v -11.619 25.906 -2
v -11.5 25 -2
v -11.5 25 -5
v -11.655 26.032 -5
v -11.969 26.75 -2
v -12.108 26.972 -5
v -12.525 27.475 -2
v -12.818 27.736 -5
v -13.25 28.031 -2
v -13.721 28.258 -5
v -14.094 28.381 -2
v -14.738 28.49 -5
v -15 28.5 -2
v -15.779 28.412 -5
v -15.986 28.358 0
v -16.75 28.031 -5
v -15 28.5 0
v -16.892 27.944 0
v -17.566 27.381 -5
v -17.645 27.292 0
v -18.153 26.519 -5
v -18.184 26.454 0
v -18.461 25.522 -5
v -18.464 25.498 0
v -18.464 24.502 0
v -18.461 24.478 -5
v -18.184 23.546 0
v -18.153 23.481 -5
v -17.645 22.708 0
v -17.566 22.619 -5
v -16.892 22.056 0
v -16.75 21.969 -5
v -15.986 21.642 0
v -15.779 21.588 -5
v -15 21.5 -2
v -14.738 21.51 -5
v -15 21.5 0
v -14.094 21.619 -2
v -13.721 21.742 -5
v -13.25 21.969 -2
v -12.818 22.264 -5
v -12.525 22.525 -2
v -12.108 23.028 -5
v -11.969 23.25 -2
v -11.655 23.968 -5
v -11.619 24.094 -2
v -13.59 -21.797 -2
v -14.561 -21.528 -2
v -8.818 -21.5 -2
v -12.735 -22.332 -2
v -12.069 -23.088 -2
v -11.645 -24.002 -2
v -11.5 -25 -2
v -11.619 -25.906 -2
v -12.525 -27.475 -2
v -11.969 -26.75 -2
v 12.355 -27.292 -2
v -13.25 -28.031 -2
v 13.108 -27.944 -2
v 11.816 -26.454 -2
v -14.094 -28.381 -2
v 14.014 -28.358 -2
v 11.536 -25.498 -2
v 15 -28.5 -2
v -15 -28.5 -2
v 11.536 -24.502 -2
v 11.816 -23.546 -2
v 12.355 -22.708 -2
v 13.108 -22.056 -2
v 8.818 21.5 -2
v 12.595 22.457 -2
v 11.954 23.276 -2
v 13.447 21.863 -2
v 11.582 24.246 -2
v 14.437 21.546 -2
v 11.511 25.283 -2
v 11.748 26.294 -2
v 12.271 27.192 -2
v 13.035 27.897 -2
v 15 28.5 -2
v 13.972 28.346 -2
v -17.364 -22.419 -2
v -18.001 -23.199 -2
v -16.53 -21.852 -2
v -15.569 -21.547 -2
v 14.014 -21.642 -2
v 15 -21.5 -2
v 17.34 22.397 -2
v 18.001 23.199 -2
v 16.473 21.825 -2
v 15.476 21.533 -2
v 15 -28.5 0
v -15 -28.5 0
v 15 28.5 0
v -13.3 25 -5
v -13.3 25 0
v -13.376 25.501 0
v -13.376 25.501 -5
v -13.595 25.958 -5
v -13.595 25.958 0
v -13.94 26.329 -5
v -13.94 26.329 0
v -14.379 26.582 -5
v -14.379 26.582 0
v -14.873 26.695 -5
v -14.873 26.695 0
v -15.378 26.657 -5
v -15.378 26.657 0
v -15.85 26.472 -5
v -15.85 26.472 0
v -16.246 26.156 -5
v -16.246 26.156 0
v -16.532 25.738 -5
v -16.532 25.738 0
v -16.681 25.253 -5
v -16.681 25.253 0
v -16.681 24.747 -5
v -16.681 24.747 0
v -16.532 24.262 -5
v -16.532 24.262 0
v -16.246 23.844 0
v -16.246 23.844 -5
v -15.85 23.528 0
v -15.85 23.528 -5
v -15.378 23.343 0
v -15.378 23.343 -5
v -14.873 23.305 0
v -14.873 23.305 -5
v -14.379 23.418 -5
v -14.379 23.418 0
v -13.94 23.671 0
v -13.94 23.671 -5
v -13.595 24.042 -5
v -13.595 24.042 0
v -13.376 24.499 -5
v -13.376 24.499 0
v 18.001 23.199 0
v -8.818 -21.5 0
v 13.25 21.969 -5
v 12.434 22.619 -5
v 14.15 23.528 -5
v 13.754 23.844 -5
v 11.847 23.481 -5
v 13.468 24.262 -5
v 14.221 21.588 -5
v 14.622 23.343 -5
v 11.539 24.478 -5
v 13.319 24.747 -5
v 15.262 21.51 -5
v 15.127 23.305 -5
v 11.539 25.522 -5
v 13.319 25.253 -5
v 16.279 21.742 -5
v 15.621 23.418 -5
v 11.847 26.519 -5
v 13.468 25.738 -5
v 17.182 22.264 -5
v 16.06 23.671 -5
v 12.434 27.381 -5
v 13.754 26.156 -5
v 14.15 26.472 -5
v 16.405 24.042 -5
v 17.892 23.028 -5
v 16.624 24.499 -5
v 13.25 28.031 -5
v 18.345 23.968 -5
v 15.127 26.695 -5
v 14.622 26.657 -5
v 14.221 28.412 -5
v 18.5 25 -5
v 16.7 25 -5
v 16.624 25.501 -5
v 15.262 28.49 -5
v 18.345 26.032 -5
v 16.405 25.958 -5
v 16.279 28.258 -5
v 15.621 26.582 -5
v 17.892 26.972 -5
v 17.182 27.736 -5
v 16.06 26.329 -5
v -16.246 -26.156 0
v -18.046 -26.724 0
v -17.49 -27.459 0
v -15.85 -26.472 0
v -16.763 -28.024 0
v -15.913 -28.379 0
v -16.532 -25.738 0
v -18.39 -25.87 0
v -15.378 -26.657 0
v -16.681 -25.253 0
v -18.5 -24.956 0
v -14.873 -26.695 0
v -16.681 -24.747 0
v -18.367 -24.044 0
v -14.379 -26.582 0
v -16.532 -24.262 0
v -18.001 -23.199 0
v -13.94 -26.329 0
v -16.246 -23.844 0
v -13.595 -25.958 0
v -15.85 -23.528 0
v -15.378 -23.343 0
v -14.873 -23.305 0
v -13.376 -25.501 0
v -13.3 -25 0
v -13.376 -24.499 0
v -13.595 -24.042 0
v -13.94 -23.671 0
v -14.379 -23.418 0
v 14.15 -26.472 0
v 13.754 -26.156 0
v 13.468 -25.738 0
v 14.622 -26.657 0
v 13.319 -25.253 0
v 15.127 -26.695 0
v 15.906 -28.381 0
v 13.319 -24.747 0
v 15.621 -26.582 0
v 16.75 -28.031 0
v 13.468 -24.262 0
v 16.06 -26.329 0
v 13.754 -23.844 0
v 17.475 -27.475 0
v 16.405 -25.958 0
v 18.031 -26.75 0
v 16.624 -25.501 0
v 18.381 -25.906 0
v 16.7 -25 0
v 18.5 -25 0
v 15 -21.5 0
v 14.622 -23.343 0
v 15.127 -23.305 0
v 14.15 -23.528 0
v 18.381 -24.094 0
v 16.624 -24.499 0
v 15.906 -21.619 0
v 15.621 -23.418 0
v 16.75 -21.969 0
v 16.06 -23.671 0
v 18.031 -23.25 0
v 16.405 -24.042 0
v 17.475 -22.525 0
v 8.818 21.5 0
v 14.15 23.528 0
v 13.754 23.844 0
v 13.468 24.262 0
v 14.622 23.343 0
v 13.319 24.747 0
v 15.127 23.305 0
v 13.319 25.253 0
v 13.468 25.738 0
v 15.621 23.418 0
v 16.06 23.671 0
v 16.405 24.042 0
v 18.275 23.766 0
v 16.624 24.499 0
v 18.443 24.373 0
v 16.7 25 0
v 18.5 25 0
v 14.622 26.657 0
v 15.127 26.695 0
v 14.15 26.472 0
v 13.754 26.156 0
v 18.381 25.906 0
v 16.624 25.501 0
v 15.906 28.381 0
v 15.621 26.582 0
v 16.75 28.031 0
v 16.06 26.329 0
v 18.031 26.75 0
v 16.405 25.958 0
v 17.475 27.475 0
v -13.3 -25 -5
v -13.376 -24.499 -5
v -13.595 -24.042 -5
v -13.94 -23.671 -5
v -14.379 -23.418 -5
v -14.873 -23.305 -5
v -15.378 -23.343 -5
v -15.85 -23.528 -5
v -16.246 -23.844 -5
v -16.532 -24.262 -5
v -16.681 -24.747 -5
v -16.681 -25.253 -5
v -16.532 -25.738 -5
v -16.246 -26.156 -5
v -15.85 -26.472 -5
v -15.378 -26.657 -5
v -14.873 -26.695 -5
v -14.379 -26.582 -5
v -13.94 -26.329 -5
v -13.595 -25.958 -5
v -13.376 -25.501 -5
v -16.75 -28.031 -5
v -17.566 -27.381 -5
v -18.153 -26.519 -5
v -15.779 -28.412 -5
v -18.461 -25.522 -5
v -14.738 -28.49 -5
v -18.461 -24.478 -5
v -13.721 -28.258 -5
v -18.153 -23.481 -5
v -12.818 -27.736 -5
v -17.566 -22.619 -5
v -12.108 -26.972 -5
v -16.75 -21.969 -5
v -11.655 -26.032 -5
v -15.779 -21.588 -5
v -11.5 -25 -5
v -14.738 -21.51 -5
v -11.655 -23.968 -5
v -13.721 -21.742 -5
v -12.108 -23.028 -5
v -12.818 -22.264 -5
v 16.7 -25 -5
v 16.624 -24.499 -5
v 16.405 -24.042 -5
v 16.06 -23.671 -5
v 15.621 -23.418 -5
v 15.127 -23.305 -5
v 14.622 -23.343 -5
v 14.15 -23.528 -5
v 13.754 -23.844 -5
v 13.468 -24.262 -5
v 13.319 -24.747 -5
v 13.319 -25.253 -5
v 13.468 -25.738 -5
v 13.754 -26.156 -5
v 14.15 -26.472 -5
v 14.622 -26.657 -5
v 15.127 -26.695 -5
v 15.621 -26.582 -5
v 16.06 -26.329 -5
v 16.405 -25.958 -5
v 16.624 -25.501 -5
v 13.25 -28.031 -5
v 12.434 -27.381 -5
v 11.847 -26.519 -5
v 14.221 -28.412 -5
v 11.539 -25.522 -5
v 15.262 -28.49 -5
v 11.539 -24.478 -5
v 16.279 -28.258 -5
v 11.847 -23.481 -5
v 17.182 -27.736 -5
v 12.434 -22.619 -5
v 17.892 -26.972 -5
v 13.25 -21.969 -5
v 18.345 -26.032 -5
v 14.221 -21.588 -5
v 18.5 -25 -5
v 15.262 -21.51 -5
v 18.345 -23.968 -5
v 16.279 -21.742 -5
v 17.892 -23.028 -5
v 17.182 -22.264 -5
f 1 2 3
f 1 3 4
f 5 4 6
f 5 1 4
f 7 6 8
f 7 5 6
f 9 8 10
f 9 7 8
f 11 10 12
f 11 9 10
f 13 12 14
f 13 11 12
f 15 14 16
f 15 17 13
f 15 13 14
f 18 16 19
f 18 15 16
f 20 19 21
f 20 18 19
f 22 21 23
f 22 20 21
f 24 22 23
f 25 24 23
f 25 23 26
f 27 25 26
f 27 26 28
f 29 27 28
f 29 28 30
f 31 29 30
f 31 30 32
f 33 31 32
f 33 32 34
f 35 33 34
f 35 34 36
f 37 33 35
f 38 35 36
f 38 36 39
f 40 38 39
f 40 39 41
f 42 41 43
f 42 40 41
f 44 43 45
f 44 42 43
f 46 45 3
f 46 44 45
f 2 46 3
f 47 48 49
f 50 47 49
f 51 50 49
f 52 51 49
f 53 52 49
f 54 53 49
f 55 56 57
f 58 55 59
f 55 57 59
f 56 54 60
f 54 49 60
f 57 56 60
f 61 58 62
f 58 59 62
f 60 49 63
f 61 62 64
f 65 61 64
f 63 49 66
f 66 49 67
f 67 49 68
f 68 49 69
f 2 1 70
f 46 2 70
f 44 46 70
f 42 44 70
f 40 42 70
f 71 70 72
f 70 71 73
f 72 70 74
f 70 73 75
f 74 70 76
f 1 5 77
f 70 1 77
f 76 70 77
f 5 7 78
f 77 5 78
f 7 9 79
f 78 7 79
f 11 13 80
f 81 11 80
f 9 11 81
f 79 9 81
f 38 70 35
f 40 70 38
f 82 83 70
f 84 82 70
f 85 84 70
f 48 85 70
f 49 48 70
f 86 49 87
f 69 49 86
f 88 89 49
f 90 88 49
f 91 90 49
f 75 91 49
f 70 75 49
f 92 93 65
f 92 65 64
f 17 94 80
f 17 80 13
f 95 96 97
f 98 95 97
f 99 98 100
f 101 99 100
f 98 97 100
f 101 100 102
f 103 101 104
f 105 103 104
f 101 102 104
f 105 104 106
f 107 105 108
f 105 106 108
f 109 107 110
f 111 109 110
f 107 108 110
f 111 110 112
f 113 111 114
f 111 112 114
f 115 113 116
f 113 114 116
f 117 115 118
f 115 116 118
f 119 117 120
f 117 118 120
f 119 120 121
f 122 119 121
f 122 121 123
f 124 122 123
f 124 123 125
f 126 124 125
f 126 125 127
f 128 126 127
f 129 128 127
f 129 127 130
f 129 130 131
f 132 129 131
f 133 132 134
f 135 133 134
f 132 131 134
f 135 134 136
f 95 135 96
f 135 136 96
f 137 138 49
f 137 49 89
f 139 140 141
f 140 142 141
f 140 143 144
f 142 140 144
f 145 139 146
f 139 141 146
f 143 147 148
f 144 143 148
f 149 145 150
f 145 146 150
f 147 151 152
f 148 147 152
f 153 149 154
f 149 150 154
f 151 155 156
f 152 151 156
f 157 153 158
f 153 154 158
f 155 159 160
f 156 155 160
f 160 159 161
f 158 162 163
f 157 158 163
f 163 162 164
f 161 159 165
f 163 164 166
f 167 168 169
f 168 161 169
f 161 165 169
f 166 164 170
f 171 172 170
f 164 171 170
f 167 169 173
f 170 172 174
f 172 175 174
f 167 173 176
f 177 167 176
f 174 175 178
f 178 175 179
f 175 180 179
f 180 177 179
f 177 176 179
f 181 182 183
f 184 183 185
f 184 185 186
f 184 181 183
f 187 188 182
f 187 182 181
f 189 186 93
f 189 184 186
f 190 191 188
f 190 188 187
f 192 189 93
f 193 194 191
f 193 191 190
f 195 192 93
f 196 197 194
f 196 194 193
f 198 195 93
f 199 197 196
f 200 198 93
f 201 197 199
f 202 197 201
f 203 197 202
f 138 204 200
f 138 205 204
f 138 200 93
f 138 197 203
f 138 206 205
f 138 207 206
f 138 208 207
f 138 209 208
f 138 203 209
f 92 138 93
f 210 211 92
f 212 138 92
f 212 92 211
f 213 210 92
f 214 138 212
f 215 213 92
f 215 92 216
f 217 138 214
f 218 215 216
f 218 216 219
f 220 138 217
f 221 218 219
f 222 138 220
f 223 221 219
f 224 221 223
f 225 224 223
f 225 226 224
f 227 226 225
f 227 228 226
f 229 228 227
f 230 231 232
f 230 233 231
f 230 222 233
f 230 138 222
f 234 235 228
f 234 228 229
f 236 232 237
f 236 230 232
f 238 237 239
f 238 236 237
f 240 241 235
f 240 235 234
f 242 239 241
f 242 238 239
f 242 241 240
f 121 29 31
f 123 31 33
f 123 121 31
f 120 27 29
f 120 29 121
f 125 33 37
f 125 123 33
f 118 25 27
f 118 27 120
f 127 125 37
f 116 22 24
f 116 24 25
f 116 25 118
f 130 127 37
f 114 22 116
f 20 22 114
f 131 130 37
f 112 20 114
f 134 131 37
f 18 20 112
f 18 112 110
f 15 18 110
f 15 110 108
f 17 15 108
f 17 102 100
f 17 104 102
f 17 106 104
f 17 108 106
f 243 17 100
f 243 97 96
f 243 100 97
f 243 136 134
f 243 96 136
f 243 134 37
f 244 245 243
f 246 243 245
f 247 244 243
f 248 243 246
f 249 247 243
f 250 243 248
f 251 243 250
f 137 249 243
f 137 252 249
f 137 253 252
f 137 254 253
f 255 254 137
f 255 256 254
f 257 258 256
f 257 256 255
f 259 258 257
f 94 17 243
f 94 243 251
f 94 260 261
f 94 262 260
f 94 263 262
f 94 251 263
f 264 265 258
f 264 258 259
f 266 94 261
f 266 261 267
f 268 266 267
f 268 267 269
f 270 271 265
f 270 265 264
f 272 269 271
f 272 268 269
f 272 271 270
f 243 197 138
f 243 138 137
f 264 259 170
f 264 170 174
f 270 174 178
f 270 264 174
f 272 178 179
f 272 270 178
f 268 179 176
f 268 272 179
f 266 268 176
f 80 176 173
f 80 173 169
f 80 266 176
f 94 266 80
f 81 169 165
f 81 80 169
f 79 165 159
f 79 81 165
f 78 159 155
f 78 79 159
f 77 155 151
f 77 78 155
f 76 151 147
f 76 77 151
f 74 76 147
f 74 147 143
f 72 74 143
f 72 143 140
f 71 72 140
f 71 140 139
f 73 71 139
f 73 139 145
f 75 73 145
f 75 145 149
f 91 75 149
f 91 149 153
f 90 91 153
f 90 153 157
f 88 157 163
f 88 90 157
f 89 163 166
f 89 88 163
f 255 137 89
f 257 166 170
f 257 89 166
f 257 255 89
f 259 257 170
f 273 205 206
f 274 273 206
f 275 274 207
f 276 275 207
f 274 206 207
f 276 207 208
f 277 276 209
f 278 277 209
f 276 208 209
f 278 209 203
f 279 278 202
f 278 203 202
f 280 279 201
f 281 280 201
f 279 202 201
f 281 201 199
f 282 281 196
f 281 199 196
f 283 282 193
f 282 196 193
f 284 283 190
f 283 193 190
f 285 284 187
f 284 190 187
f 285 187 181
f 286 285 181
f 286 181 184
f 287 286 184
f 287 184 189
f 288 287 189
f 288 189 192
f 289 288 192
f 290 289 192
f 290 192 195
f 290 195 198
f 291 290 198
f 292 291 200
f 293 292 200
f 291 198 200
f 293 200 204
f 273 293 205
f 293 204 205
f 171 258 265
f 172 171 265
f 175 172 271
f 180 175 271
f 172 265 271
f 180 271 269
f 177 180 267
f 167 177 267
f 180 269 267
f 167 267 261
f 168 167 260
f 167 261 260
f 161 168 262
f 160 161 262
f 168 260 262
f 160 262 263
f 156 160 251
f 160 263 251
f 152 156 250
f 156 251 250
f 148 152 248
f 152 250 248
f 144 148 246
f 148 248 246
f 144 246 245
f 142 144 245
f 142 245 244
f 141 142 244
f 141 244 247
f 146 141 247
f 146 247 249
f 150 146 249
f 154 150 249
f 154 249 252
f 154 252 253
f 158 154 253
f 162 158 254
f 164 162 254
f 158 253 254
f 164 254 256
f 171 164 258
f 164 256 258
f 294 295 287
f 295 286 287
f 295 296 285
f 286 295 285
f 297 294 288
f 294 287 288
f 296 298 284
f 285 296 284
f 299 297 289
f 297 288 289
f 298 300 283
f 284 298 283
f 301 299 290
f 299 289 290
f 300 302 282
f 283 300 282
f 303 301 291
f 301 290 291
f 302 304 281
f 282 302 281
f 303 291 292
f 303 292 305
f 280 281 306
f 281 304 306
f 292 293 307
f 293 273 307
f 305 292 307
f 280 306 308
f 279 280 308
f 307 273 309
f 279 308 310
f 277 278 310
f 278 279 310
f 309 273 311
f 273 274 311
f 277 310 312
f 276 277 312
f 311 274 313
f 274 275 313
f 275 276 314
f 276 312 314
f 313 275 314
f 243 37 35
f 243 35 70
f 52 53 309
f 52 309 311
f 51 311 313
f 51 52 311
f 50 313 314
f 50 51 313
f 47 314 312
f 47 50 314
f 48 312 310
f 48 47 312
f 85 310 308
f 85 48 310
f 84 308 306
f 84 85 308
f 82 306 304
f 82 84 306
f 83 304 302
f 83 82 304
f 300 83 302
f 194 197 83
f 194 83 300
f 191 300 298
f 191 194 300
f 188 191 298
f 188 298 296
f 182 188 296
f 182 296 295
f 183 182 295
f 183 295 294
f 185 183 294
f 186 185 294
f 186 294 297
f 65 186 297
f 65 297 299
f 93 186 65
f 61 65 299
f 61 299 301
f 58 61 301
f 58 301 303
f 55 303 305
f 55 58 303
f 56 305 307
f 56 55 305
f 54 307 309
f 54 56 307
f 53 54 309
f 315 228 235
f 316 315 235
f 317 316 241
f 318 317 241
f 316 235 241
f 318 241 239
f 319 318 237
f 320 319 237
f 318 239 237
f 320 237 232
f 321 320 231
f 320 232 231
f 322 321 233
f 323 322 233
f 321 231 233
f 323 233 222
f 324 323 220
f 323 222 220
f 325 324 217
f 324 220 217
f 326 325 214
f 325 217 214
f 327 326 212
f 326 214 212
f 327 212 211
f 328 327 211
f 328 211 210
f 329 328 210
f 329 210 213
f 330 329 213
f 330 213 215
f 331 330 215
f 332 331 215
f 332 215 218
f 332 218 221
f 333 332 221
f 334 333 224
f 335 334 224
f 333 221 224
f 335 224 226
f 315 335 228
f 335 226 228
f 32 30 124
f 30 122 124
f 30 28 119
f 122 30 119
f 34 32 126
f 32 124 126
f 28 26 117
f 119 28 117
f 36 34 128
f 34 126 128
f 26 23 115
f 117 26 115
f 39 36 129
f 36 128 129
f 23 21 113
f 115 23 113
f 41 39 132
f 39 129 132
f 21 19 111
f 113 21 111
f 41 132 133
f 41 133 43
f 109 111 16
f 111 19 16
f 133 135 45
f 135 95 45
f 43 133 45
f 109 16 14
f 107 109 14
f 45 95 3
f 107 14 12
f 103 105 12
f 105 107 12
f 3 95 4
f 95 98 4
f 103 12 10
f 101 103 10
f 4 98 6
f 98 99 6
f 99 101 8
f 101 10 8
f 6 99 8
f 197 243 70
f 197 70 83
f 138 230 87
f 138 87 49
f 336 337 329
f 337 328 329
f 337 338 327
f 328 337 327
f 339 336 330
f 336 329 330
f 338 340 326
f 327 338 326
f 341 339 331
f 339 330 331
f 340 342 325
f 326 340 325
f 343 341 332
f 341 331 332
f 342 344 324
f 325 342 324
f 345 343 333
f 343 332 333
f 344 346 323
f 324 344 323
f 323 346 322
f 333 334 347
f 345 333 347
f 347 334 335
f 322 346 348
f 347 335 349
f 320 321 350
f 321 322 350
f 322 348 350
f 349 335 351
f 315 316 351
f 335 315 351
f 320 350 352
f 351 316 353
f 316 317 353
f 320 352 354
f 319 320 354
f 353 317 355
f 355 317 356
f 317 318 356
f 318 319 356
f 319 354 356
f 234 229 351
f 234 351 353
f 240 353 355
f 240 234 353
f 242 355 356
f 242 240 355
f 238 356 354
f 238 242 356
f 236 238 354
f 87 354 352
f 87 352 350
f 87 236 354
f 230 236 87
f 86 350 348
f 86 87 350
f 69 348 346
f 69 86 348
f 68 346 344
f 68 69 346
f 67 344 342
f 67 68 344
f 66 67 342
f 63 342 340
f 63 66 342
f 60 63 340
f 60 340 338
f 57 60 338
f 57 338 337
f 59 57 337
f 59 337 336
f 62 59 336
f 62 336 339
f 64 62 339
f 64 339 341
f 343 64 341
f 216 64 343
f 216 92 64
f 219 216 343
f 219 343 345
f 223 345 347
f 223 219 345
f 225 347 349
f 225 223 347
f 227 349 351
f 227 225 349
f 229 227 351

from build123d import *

# Parameters (mm, degrees)
EXTRUDE_944_DEPTH  = 2
SKETCH_1_3_R       = 3.5
SKETCH_1_3_R_2     = 1.7
EXTRUDE_1016_DEPTH = 5


with BuildPart() as part:
    # Эскиз1 → Extrude 944 (new body)
    with BuildSketch(Plane.XY):
        with BuildLine():
            Line((15, 28.5), (-15, 28.5))
            ThreePointArc((-15, 28.5), (-12.525126266, 27.474873734), (-11.5, 25))
            ThreePointArc((-11.5, 25), (-12.525126266, 22.525126266), (-15, 21.5))
            Line((-15, 21.5), (8.818333674, 21.5))
            Line((8.818333674, 21.5), (-18.00122524, -23.199264856))
            ThreePointArc((-18.00122524, -23.199264856), (-14.065732463, -21.626997751), (-11.5, -25))
            ThreePointArc((-11.5, -25), (-12.525126266, -27.474873734), (-15, -28.5))
            Line((-15, -28.5), (15, -28.5))
            ThreePointArc((15, -28.5), (11.5, -25), (15, -21.5))
            Line((15, -21.5), (-8.818333674, -21.5))
            Line((-8.818333674, -21.5), (18.00122524, 23.199264856))
            ThreePointArc((18.00122524, 23.199264856), (11.954300326, 23.275554148), (15, 28.5))
        make_face()
    extrude(amount=-EXTRUDE_944_DEPTH)

    # Эскиз1<3> → Extrude 1016 (add)
    # profile 1 of 4: a face of its own
    with BuildSketch(Plane.XY):
        with Locations((15, 25)):
            Circle(SKETCH_1_3_R)
        with Locations((15, 25)):
            Circle(SKETCH_1_3_R_2, mode=Mode.SUBTRACT)
    # profile 2 of 4: a face of its own
    with BuildSketch(Plane.XY):
        with Locations((15, -25)):
            Circle(SKETCH_1_3_R)
        with Locations((15, -25)):
            Circle(SKETCH_1_3_R_2, mode=Mode.SUBTRACT)
    # profile 3 of 4: a face of its own
    with BuildSketch(Plane.XY):
        with Locations((-15, -25)):
            Circle(SKETCH_1_3_R)
        with Locations((-15, -25)):
            Circle(SKETCH_1_3_R_2, mode=Mode.SUBTRACT)
    # profile 4 of 4: a face of its own
    with BuildSketch(Plane.XY):
        with Locations((-15, 25)):
            Circle(SKETCH_1_3_R)
        with Locations((-15, 25)):
            Circle(SKETCH_1_3_R_2, mode=Mode.SUBTRACT)
    extrude(amount=-EXTRUDE_1016_DEPTH)


solid = part.part
